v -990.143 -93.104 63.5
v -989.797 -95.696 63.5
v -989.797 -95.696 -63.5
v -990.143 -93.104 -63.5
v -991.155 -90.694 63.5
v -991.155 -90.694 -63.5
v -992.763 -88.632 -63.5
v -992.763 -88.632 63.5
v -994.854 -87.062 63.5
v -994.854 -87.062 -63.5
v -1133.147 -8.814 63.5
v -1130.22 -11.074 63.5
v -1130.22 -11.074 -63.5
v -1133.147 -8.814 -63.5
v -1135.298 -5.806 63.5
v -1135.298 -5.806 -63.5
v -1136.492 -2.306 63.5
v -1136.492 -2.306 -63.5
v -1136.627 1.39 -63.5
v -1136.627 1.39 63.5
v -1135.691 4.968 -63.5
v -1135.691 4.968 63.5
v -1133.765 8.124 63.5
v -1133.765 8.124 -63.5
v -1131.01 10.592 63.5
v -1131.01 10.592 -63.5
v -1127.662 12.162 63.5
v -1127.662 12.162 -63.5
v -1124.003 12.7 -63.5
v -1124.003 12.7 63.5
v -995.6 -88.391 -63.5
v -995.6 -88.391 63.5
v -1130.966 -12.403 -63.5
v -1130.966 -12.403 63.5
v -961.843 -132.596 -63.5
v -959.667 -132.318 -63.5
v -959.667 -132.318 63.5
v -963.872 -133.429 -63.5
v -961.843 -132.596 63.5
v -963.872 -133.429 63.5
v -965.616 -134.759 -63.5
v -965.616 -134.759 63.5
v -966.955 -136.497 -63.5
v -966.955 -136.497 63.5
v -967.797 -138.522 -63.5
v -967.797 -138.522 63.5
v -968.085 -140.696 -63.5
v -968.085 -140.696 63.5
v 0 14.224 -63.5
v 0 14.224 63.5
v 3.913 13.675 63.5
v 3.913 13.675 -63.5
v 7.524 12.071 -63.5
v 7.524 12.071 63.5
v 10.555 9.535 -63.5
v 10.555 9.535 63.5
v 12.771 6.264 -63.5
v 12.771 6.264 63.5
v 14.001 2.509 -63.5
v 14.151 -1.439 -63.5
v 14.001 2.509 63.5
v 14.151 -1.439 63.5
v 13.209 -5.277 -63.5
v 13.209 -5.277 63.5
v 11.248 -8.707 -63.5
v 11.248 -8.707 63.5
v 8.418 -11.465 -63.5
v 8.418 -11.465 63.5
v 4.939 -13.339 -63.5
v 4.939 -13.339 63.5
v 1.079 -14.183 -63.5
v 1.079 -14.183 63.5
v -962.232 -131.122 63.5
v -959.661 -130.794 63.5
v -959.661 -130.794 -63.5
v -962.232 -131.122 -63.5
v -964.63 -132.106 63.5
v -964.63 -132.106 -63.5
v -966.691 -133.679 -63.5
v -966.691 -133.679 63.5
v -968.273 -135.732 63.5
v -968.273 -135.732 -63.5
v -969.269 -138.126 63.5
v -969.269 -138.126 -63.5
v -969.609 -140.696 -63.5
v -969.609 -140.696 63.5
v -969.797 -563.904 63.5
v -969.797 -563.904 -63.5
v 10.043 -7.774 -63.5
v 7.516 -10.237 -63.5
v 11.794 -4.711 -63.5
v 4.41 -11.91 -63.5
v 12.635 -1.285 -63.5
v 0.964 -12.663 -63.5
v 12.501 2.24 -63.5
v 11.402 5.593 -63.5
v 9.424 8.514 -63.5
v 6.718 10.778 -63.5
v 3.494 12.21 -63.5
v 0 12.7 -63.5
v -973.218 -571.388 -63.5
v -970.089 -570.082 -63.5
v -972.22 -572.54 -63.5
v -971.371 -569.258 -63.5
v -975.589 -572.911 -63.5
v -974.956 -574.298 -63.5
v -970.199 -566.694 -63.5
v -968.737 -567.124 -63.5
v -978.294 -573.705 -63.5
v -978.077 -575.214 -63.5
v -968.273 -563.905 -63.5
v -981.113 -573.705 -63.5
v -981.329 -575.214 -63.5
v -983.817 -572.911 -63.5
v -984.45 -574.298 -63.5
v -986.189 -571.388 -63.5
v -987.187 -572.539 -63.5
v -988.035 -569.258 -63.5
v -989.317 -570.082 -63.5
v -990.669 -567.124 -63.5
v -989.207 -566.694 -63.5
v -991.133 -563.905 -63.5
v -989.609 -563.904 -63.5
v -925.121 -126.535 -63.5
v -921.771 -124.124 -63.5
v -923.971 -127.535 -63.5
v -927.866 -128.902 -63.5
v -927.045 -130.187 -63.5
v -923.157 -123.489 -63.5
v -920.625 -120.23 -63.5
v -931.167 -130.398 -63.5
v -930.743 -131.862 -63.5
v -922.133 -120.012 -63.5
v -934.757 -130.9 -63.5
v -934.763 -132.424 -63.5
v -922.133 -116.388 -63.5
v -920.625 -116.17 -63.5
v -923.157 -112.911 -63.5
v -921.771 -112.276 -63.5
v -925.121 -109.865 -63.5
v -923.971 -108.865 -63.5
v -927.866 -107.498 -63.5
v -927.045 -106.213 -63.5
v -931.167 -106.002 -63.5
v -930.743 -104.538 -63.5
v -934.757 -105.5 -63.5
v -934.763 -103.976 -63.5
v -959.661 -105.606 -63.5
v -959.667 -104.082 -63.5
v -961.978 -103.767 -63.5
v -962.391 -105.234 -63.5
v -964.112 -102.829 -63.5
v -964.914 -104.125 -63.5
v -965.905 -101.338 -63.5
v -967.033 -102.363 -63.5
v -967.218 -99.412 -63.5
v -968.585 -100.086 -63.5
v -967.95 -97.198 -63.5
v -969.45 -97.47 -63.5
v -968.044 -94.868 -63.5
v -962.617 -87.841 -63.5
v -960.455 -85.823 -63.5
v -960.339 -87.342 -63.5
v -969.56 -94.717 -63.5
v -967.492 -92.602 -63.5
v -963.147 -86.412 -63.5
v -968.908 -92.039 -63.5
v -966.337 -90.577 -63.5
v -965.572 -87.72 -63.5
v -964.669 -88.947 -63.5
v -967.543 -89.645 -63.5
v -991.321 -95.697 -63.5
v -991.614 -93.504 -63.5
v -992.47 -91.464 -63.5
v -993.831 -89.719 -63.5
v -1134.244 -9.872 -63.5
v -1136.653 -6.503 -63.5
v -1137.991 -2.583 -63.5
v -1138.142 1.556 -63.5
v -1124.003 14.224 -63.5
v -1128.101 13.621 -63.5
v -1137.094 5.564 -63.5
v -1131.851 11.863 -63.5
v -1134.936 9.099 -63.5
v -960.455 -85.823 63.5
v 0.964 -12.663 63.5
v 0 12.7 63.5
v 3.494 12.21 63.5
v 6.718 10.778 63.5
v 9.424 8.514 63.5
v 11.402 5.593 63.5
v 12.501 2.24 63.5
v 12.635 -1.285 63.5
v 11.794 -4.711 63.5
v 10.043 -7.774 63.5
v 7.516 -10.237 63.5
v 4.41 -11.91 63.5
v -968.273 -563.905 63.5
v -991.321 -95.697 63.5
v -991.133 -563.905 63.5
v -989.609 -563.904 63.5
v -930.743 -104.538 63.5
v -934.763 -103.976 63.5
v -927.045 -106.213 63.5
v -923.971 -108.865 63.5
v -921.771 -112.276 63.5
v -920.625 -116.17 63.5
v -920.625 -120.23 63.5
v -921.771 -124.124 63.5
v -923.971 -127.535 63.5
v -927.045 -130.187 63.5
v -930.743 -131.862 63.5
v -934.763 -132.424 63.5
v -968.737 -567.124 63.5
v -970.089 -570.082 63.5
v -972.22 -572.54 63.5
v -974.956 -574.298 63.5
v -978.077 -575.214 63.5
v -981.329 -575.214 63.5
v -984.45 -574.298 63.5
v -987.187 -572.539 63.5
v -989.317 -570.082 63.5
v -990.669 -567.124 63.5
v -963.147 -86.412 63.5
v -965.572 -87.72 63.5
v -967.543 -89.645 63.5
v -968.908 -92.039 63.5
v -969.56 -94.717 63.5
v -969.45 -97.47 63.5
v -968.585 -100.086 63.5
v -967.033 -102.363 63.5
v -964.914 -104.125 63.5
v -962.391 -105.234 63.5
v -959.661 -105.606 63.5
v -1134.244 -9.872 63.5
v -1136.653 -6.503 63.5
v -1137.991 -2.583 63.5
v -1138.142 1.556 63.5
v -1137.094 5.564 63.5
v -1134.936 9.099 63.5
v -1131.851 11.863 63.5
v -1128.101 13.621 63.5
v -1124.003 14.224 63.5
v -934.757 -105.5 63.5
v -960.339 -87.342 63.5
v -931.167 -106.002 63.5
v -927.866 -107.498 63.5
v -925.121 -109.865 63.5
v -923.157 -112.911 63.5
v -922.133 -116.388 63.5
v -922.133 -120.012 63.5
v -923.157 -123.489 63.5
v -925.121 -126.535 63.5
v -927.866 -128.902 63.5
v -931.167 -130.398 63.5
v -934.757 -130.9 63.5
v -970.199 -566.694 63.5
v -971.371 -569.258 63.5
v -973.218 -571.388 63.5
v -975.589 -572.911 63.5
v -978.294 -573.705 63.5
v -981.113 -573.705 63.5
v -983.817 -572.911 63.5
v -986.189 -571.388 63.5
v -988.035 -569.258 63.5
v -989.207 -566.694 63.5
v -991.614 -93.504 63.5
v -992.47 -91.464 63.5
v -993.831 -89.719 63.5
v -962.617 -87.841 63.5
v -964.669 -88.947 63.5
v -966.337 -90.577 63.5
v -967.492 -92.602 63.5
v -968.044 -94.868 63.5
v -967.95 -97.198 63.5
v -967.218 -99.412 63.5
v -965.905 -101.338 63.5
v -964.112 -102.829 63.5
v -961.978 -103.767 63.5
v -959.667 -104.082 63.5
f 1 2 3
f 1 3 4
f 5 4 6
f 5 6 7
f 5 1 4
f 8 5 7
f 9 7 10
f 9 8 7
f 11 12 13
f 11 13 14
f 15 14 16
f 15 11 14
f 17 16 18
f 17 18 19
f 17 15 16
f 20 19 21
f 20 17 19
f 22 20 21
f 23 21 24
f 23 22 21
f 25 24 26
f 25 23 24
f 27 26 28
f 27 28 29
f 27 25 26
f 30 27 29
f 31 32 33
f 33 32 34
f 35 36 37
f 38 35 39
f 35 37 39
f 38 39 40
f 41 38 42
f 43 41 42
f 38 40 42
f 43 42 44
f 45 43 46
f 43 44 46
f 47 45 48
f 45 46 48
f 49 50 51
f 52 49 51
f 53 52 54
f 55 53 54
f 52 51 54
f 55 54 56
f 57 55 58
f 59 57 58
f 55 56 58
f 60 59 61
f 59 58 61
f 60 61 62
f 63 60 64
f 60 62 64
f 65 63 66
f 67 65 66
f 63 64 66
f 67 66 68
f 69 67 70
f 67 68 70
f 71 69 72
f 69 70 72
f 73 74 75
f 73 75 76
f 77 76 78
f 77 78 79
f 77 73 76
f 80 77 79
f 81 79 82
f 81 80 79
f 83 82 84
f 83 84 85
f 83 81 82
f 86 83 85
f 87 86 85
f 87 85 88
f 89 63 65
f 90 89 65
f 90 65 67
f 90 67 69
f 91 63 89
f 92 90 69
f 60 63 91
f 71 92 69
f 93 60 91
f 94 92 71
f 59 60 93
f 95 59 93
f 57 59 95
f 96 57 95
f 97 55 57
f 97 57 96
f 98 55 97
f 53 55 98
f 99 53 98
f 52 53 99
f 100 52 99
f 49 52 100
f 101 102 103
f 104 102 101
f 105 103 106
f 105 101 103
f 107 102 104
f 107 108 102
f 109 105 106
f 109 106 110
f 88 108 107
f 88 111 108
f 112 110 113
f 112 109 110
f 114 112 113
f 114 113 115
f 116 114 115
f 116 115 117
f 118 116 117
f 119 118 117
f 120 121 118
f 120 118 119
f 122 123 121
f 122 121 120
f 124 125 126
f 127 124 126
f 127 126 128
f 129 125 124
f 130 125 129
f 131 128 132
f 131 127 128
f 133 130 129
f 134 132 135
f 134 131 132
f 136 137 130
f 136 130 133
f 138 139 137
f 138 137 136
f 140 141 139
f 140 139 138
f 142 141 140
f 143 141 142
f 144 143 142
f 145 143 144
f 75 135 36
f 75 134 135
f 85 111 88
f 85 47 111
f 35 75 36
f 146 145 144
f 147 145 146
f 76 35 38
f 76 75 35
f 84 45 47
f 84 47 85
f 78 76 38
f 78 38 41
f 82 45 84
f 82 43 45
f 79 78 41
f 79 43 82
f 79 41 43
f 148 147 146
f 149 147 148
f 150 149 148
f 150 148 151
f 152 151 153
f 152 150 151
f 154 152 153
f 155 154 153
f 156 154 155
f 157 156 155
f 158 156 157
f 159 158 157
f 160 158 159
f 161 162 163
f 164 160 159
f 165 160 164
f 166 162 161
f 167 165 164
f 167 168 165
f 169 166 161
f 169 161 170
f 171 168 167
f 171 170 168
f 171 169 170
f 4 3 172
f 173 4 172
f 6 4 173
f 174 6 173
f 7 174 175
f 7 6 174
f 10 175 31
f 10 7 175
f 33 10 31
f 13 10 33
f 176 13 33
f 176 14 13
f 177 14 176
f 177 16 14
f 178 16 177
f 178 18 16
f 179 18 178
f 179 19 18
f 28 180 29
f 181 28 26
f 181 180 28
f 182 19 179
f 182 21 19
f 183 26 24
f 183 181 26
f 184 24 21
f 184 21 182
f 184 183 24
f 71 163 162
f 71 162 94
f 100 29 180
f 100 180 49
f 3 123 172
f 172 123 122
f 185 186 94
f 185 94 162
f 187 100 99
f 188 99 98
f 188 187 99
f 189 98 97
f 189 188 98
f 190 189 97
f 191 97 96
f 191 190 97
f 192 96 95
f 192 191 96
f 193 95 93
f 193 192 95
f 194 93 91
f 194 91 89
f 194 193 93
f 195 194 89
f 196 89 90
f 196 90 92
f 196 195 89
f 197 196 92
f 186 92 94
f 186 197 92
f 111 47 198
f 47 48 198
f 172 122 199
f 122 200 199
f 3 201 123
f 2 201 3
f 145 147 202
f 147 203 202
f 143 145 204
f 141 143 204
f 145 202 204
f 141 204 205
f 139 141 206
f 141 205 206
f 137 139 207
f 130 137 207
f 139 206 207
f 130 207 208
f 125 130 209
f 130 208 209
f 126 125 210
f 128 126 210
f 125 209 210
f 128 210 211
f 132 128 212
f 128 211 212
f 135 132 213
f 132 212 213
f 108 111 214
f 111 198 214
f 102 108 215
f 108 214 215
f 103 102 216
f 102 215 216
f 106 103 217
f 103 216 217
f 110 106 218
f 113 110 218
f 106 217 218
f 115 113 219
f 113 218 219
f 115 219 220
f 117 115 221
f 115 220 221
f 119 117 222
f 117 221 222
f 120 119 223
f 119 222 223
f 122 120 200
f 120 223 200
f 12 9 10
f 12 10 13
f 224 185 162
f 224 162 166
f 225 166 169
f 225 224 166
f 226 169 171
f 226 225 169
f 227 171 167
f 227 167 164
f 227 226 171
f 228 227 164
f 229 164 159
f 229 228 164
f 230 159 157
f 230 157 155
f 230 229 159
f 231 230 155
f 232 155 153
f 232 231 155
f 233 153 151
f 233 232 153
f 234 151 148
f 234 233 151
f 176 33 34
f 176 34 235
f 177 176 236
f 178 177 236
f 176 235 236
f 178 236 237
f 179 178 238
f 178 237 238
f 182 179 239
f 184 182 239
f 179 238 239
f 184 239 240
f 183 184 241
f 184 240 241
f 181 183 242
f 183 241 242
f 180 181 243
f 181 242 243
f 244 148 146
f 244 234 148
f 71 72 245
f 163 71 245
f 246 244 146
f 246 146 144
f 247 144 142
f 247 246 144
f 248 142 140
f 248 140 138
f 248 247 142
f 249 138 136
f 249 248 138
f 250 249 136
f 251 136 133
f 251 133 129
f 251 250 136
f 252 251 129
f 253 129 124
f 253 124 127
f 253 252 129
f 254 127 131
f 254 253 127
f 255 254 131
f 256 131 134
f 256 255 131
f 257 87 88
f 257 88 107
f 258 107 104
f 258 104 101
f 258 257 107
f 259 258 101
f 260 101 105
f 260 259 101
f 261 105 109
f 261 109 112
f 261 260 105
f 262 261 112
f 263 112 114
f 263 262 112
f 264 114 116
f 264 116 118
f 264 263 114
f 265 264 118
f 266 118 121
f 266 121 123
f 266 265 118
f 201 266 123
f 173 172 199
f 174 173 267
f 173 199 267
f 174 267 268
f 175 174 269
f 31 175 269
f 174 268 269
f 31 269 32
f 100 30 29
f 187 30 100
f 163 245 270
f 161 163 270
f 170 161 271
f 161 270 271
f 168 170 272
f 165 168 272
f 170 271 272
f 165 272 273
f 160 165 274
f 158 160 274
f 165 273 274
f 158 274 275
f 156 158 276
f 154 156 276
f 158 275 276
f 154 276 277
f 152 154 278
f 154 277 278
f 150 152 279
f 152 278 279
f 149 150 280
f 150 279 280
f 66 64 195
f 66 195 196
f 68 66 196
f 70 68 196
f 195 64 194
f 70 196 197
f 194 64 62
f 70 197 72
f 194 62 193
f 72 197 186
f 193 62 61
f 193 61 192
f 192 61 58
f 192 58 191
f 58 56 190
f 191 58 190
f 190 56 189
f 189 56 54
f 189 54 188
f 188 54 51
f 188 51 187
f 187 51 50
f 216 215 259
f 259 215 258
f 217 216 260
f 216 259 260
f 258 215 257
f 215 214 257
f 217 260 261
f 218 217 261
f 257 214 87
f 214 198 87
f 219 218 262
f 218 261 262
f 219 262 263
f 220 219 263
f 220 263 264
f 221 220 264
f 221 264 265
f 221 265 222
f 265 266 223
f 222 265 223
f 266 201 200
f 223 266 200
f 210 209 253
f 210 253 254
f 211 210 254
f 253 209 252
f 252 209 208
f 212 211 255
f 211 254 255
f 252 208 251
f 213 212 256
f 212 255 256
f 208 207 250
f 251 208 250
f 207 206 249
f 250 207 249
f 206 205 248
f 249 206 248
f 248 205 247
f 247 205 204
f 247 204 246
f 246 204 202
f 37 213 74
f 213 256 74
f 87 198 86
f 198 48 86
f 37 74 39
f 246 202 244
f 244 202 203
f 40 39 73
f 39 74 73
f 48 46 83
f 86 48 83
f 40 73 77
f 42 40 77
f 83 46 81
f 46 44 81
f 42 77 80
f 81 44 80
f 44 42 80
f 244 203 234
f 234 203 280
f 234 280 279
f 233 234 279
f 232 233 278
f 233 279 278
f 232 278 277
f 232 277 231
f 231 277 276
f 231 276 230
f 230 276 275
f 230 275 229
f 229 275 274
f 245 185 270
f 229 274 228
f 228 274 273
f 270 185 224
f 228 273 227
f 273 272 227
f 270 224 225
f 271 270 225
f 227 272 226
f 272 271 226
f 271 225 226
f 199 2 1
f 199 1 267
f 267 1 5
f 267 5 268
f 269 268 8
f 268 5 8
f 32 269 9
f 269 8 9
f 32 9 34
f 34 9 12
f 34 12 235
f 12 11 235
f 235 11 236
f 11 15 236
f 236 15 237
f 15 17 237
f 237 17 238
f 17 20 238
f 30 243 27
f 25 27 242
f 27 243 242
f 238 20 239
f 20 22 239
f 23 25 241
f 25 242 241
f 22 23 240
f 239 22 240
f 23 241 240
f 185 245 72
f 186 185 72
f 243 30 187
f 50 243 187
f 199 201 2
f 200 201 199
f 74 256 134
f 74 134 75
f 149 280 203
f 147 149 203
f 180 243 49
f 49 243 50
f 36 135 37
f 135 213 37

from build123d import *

# Parameters (mm, degrees)
EXTRUDE_THIN1_DEPTH = 63.5


with BuildPart() as part:
    # Sketch1 → Extrude-Thin1 (new body, symmetric)
    with BuildSketch(Plane.XY):
        with BuildLine():
            Line((-959.66739225, -104.081924367), (-934.763425273, -103.976128348))
            ThreePointArc((-934.763425273, -103.976128348), (-920.479, -118.2), (-934.763425273, -132.423871652))
            Line((-934.763425273, -132.423871652), (-959.66739225, -132.318075633))
            ThreePointArc((-959.66739225, -132.318075633), (-965.616046993, -134.759141539), (-968.084999173, -140.696276466))
            Line((-968.084999173, -140.696276466), (-968.273001128, -563.905077546))
            ThreePointArc((-968.273001128, -563.905077546), (-979.703244004, -575.329999997), (-991.132999079, -563.904589538))
            Line((-991.132999079, -563.904589538), (-991.321000676, -95.696634339))
            ThreePointArc((-991.321000676, -95.696634339), (-992.470278455, -91.463767823), (-995.600017332, -88.39086481))
            Line((-995.600017332, -88.39086481), (-1130.965637255, -12.403380928))
            ThreePointArc((-1130.965637255, -12.403380928), (-1137.764320182, 3.59836669), (-1124.003, 14.224))
            Line((-1124.003, 14.224), (0, 14.224))
            ThreePointArc((0, 14.224), (14.213745369, 0.540017203), (1.079255768, -14.182996263))
            Line((1.079255768, -14.182996263), (-960.338990006, -87.342162917))
            ThreePointArc((-960.338990006, -87.342162917), (-968.078262268, -96.036014785), (-959.66739225, -104.081924367))
        make_face()
        with BuildLine():
            Line((-959.660918114, -105.605910615), (-934.756951136, -105.500114596))
            ThreePointArc((-934.756951136, -105.500114596), (-922.003, -118.2), (-934.756951136, -130.899885404))
            Line((-934.756951136, -130.899885404), (-959.660918114, -130.794089385))
            ThreePointArc((-959.660918114, -130.794089385), (-966.691146447, -133.678985455), (-969.608999023, -140.69559946))
            Line((-969.608999023, -140.69559946), (-969.797000977, -563.90440054))
            ThreePointArc((-969.797000977, -563.90440054), (-979.70321147, -573.805999998), (-989.608999201, -563.903977599))
            Line((-989.608999201, -563.903977599), (-989.797000799, -95.696022401))
            ThreePointArc((-989.797000799, -95.696022401), (-991.155238175, -90.693543791), (-994.854020483, -87.061931139))
            Line((-994.854020483, -87.061931139), (-1130.219640407, -11.074447257))
            ThreePointArc((-1130.219640407, -11.074447257), (-1136.28989302, 3.212827402), (-1124.003, 12.7))
            Line((-1124.003, 12.7), (0, 12.7))
            ThreePointArc((0, 12.7), (12.69084408, 0.482158217), (0.963621221, -12.66338952))
            Line((0.963621221, -12.66338952), (-960.454624553, -85.822556174))
            ThreePointArc((-960.454624553, -85.822556174), (-969.601037226, -96.097108382), (-959.660918114, -105.605910615))
        make_face(mode=Mode.SUBTRACT)
    extrude(amount=EXTRUDE_THIN1_DEPTH, both=True)


solid = part.part
